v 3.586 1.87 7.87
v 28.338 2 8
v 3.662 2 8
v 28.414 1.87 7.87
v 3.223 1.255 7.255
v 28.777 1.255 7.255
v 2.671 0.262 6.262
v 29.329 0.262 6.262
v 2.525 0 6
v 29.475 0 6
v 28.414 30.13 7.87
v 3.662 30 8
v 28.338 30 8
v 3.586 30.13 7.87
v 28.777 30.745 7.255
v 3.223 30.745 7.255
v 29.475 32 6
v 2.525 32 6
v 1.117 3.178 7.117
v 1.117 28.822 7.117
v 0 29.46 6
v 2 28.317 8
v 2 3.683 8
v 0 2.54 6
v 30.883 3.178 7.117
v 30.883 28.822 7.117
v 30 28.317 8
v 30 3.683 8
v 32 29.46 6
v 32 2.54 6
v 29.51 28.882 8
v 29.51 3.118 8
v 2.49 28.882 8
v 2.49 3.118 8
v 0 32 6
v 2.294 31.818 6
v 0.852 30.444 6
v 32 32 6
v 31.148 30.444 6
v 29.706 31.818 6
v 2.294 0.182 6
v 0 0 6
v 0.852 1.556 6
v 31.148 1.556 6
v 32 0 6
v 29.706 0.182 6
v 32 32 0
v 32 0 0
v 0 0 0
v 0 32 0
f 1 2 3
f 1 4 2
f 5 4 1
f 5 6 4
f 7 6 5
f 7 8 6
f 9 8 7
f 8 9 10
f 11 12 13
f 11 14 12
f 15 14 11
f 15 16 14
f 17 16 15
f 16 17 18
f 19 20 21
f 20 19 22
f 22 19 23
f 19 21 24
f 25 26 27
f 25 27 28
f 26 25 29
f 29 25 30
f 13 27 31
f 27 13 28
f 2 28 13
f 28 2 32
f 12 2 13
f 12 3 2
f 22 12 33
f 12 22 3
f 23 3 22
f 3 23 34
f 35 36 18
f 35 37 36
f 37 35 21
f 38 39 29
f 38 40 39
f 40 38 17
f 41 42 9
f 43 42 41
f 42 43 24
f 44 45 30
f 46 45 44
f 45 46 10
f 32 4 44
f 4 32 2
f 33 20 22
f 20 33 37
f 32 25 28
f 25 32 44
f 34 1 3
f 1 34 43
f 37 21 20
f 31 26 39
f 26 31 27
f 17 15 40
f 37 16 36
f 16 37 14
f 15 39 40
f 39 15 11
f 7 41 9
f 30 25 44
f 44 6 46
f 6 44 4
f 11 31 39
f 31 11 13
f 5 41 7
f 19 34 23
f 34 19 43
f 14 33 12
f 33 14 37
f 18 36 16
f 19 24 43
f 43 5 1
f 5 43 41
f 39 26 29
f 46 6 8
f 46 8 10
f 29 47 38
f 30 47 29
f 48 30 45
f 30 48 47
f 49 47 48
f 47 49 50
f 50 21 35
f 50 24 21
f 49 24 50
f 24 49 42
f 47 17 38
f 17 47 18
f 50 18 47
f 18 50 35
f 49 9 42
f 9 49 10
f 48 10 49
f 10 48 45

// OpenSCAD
// file: WylochStyleDungeonLibrary.scad
size = 32;
baseheight = 6;
topperheight = 2;
topperrounded = true;
walllength = size;
wallheight = 25 + baseheight + topperheight;
wallwidth = 6;
wallwidththin = 4;

function hypotenuse_ra(side_a, side_b) =
    sqrt(pow(side_a, 2) + pow(side_b, 2));
    
module wsdl_Base(s,bh)
{
    cube([s,s,bh]);
}

module wsdl_Topper(s,bh,th,tr)
{
    if (tr) {
        translate([0,0,bh])
            intersection() {
                difference () {
                        cube([s,s,th]);
                        union () {
                        rotate(a=45, v=[1,0,0])
                            cube([s,th*2,th*2]);
                        translate([0,s,0])
                            rotate(a=45, v=[1,0,0])
                                cube([s,th*2,th*2]);
                        rotate(a=-45, v=[0,1,0])
                            cube([th*2,s,th*2]);
                        translate([s,0,0])
                            rotate(a=-45, v=[0,1,0])
                                cube([th*2,s,th*2]);
                        }
                }
                translate([s/2,s/2,0])
                    cylinder(
                        h=th, 
                        r1=hypotenuse_ra(s/2-1.2, s/2-1.2), 
                        r2=hypotenuse_ra(s/2-th-.8, s/2-th-.8), 
                        center=false, 
                        $fa=.1);
            }    
    }
    else {
        translate([0,0,bh])
            difference() {
                cube([s,s,th]);
                union () {
                rotate(a=45, v=[1,0,0])
                    cube([s,th*2,th*2]);
                translate([0,s,0])
                    rotate(a=45, v=[1,0,0])
                        cube([s,th*2,th*2]);
                rotate(a=-45, v=[0,1,0])
                    cube([th*2,s,th*2]);
                translate([s,0,0])
                    rotate(a=-45, v=[0,1,0])
                        cube([th*2,s,th*2]);
                }
            }    
    }
}

module wsdl_Base_1x1(s,bh,th,tr) 
{
    union () {
        wsdl_Base(s,bh);
        wsdl_Topper(s,bh,th,tr);
    }
}

module wsdl_Base_1x2(s,bh,th,tr)
{
    union () {
        wsdl_Base_1x1(s,bh,th,tr);
        translate([s,0,0])
            wsdl_Base_1x1(s,bh,th,tr);
    }
}
 
module wsdl_Base_2x2(s,bh,th,tr)
{
    union () {
        wsdl_Base_1x2(s,bh,th,tr);
        translate([0,s,0])
            wsdl_Base_1x2(s,bh,th,tr);
    }
}
 
module wsdl_Base_2x4(s,bh,th,tr)
{
    union () {
        wsdl_Base_2x2(s,bh,th,tr);
        translate([s*2,0,0])
            wsdl_Base_2x2(s,bh,th,tr);
    }
}
 
module wsdl_Base_4x4(s,bh,th,tr)
{
    union () {
        wsdl_Base_2x4(s,bh,th,tr);
        translate([0,s*2,0])
            wsdl_Base_2x4(s,bh,th,tr);
    }
}
 
module wsdl_Wall_1(w,l,h)
{
    cube([w,l,h]);   
}

module wsdl_Wall_2(w,l,h)
{
    union() {
        wsdl_Wall_1(w,l,h);
        translate([0,l,0])
            wsdl_Wall_1(w,l,h);
    }
}

module wsdl_Wall_1_Left(w,l,h) 
{
    wsdl_Wall_1(w,l,h);
}

module wsdl_Wall_1_Right(w,l,h) 
{
    translate([(size)-w,0,0])
        wsdl_Wall_1(w,l,h);
}

module wsdl_Wall_1_DoubleRight(w,l,h) 
{
    translate([(size*2)-w,0,0])
        wsdl_Wall_1(w,l,h);
}

module wsdl_Wall_1_Bottom(w,l,h) 
{
rotate(a=-90)
    translate([-w,0,0])
        wsdl_Wall_1(w,l,h);

}

module wsdl_Wall_1_Top(w,l,h) 
{
rotate(a=-90)
    translate([-l,0,0])
        wsdl_Wall_1(w,l,h);

}

module wsdl_Wall_1_Center(w,l,h) 
{
    translate([(size)-w/2,0,0])
        wsdl_Wall_1(w,l,h);
}


module wsdl_Wall_2_Left(w,l,h) 
{
    wsdl_Wall_2(w,l,h);
}

module wsdl_Wall_2_Right(w,l,h) 
{
    translate([(size*2)-w,0,0])
        wsdl_Wall_2(w,l,h);
}

module wsdl_Wall_2_Bottom(w,l,h) 
{
rotate(a=-90)
    translate([-w,0,0])
        wsdl_Wall_2(w,l,h);

}

module wsdl_Wall_2_Top(w,l,h) 
{
rotate(a=-90)
    translate([-l*2,0,0])
        wsdl_Wall_2(w,l,h);

}

module wsdl_Wall_2_Center(w,l,h) 
{
    translate([(size)-w/2,0,0])
        wsdl_Wall_2(w,l,h);
}
// main file
include <WylochStyleDungeonLibrary.scad>; 

wsdl_Base_1x1(size,baseheight,topperheight,topperrounded);
